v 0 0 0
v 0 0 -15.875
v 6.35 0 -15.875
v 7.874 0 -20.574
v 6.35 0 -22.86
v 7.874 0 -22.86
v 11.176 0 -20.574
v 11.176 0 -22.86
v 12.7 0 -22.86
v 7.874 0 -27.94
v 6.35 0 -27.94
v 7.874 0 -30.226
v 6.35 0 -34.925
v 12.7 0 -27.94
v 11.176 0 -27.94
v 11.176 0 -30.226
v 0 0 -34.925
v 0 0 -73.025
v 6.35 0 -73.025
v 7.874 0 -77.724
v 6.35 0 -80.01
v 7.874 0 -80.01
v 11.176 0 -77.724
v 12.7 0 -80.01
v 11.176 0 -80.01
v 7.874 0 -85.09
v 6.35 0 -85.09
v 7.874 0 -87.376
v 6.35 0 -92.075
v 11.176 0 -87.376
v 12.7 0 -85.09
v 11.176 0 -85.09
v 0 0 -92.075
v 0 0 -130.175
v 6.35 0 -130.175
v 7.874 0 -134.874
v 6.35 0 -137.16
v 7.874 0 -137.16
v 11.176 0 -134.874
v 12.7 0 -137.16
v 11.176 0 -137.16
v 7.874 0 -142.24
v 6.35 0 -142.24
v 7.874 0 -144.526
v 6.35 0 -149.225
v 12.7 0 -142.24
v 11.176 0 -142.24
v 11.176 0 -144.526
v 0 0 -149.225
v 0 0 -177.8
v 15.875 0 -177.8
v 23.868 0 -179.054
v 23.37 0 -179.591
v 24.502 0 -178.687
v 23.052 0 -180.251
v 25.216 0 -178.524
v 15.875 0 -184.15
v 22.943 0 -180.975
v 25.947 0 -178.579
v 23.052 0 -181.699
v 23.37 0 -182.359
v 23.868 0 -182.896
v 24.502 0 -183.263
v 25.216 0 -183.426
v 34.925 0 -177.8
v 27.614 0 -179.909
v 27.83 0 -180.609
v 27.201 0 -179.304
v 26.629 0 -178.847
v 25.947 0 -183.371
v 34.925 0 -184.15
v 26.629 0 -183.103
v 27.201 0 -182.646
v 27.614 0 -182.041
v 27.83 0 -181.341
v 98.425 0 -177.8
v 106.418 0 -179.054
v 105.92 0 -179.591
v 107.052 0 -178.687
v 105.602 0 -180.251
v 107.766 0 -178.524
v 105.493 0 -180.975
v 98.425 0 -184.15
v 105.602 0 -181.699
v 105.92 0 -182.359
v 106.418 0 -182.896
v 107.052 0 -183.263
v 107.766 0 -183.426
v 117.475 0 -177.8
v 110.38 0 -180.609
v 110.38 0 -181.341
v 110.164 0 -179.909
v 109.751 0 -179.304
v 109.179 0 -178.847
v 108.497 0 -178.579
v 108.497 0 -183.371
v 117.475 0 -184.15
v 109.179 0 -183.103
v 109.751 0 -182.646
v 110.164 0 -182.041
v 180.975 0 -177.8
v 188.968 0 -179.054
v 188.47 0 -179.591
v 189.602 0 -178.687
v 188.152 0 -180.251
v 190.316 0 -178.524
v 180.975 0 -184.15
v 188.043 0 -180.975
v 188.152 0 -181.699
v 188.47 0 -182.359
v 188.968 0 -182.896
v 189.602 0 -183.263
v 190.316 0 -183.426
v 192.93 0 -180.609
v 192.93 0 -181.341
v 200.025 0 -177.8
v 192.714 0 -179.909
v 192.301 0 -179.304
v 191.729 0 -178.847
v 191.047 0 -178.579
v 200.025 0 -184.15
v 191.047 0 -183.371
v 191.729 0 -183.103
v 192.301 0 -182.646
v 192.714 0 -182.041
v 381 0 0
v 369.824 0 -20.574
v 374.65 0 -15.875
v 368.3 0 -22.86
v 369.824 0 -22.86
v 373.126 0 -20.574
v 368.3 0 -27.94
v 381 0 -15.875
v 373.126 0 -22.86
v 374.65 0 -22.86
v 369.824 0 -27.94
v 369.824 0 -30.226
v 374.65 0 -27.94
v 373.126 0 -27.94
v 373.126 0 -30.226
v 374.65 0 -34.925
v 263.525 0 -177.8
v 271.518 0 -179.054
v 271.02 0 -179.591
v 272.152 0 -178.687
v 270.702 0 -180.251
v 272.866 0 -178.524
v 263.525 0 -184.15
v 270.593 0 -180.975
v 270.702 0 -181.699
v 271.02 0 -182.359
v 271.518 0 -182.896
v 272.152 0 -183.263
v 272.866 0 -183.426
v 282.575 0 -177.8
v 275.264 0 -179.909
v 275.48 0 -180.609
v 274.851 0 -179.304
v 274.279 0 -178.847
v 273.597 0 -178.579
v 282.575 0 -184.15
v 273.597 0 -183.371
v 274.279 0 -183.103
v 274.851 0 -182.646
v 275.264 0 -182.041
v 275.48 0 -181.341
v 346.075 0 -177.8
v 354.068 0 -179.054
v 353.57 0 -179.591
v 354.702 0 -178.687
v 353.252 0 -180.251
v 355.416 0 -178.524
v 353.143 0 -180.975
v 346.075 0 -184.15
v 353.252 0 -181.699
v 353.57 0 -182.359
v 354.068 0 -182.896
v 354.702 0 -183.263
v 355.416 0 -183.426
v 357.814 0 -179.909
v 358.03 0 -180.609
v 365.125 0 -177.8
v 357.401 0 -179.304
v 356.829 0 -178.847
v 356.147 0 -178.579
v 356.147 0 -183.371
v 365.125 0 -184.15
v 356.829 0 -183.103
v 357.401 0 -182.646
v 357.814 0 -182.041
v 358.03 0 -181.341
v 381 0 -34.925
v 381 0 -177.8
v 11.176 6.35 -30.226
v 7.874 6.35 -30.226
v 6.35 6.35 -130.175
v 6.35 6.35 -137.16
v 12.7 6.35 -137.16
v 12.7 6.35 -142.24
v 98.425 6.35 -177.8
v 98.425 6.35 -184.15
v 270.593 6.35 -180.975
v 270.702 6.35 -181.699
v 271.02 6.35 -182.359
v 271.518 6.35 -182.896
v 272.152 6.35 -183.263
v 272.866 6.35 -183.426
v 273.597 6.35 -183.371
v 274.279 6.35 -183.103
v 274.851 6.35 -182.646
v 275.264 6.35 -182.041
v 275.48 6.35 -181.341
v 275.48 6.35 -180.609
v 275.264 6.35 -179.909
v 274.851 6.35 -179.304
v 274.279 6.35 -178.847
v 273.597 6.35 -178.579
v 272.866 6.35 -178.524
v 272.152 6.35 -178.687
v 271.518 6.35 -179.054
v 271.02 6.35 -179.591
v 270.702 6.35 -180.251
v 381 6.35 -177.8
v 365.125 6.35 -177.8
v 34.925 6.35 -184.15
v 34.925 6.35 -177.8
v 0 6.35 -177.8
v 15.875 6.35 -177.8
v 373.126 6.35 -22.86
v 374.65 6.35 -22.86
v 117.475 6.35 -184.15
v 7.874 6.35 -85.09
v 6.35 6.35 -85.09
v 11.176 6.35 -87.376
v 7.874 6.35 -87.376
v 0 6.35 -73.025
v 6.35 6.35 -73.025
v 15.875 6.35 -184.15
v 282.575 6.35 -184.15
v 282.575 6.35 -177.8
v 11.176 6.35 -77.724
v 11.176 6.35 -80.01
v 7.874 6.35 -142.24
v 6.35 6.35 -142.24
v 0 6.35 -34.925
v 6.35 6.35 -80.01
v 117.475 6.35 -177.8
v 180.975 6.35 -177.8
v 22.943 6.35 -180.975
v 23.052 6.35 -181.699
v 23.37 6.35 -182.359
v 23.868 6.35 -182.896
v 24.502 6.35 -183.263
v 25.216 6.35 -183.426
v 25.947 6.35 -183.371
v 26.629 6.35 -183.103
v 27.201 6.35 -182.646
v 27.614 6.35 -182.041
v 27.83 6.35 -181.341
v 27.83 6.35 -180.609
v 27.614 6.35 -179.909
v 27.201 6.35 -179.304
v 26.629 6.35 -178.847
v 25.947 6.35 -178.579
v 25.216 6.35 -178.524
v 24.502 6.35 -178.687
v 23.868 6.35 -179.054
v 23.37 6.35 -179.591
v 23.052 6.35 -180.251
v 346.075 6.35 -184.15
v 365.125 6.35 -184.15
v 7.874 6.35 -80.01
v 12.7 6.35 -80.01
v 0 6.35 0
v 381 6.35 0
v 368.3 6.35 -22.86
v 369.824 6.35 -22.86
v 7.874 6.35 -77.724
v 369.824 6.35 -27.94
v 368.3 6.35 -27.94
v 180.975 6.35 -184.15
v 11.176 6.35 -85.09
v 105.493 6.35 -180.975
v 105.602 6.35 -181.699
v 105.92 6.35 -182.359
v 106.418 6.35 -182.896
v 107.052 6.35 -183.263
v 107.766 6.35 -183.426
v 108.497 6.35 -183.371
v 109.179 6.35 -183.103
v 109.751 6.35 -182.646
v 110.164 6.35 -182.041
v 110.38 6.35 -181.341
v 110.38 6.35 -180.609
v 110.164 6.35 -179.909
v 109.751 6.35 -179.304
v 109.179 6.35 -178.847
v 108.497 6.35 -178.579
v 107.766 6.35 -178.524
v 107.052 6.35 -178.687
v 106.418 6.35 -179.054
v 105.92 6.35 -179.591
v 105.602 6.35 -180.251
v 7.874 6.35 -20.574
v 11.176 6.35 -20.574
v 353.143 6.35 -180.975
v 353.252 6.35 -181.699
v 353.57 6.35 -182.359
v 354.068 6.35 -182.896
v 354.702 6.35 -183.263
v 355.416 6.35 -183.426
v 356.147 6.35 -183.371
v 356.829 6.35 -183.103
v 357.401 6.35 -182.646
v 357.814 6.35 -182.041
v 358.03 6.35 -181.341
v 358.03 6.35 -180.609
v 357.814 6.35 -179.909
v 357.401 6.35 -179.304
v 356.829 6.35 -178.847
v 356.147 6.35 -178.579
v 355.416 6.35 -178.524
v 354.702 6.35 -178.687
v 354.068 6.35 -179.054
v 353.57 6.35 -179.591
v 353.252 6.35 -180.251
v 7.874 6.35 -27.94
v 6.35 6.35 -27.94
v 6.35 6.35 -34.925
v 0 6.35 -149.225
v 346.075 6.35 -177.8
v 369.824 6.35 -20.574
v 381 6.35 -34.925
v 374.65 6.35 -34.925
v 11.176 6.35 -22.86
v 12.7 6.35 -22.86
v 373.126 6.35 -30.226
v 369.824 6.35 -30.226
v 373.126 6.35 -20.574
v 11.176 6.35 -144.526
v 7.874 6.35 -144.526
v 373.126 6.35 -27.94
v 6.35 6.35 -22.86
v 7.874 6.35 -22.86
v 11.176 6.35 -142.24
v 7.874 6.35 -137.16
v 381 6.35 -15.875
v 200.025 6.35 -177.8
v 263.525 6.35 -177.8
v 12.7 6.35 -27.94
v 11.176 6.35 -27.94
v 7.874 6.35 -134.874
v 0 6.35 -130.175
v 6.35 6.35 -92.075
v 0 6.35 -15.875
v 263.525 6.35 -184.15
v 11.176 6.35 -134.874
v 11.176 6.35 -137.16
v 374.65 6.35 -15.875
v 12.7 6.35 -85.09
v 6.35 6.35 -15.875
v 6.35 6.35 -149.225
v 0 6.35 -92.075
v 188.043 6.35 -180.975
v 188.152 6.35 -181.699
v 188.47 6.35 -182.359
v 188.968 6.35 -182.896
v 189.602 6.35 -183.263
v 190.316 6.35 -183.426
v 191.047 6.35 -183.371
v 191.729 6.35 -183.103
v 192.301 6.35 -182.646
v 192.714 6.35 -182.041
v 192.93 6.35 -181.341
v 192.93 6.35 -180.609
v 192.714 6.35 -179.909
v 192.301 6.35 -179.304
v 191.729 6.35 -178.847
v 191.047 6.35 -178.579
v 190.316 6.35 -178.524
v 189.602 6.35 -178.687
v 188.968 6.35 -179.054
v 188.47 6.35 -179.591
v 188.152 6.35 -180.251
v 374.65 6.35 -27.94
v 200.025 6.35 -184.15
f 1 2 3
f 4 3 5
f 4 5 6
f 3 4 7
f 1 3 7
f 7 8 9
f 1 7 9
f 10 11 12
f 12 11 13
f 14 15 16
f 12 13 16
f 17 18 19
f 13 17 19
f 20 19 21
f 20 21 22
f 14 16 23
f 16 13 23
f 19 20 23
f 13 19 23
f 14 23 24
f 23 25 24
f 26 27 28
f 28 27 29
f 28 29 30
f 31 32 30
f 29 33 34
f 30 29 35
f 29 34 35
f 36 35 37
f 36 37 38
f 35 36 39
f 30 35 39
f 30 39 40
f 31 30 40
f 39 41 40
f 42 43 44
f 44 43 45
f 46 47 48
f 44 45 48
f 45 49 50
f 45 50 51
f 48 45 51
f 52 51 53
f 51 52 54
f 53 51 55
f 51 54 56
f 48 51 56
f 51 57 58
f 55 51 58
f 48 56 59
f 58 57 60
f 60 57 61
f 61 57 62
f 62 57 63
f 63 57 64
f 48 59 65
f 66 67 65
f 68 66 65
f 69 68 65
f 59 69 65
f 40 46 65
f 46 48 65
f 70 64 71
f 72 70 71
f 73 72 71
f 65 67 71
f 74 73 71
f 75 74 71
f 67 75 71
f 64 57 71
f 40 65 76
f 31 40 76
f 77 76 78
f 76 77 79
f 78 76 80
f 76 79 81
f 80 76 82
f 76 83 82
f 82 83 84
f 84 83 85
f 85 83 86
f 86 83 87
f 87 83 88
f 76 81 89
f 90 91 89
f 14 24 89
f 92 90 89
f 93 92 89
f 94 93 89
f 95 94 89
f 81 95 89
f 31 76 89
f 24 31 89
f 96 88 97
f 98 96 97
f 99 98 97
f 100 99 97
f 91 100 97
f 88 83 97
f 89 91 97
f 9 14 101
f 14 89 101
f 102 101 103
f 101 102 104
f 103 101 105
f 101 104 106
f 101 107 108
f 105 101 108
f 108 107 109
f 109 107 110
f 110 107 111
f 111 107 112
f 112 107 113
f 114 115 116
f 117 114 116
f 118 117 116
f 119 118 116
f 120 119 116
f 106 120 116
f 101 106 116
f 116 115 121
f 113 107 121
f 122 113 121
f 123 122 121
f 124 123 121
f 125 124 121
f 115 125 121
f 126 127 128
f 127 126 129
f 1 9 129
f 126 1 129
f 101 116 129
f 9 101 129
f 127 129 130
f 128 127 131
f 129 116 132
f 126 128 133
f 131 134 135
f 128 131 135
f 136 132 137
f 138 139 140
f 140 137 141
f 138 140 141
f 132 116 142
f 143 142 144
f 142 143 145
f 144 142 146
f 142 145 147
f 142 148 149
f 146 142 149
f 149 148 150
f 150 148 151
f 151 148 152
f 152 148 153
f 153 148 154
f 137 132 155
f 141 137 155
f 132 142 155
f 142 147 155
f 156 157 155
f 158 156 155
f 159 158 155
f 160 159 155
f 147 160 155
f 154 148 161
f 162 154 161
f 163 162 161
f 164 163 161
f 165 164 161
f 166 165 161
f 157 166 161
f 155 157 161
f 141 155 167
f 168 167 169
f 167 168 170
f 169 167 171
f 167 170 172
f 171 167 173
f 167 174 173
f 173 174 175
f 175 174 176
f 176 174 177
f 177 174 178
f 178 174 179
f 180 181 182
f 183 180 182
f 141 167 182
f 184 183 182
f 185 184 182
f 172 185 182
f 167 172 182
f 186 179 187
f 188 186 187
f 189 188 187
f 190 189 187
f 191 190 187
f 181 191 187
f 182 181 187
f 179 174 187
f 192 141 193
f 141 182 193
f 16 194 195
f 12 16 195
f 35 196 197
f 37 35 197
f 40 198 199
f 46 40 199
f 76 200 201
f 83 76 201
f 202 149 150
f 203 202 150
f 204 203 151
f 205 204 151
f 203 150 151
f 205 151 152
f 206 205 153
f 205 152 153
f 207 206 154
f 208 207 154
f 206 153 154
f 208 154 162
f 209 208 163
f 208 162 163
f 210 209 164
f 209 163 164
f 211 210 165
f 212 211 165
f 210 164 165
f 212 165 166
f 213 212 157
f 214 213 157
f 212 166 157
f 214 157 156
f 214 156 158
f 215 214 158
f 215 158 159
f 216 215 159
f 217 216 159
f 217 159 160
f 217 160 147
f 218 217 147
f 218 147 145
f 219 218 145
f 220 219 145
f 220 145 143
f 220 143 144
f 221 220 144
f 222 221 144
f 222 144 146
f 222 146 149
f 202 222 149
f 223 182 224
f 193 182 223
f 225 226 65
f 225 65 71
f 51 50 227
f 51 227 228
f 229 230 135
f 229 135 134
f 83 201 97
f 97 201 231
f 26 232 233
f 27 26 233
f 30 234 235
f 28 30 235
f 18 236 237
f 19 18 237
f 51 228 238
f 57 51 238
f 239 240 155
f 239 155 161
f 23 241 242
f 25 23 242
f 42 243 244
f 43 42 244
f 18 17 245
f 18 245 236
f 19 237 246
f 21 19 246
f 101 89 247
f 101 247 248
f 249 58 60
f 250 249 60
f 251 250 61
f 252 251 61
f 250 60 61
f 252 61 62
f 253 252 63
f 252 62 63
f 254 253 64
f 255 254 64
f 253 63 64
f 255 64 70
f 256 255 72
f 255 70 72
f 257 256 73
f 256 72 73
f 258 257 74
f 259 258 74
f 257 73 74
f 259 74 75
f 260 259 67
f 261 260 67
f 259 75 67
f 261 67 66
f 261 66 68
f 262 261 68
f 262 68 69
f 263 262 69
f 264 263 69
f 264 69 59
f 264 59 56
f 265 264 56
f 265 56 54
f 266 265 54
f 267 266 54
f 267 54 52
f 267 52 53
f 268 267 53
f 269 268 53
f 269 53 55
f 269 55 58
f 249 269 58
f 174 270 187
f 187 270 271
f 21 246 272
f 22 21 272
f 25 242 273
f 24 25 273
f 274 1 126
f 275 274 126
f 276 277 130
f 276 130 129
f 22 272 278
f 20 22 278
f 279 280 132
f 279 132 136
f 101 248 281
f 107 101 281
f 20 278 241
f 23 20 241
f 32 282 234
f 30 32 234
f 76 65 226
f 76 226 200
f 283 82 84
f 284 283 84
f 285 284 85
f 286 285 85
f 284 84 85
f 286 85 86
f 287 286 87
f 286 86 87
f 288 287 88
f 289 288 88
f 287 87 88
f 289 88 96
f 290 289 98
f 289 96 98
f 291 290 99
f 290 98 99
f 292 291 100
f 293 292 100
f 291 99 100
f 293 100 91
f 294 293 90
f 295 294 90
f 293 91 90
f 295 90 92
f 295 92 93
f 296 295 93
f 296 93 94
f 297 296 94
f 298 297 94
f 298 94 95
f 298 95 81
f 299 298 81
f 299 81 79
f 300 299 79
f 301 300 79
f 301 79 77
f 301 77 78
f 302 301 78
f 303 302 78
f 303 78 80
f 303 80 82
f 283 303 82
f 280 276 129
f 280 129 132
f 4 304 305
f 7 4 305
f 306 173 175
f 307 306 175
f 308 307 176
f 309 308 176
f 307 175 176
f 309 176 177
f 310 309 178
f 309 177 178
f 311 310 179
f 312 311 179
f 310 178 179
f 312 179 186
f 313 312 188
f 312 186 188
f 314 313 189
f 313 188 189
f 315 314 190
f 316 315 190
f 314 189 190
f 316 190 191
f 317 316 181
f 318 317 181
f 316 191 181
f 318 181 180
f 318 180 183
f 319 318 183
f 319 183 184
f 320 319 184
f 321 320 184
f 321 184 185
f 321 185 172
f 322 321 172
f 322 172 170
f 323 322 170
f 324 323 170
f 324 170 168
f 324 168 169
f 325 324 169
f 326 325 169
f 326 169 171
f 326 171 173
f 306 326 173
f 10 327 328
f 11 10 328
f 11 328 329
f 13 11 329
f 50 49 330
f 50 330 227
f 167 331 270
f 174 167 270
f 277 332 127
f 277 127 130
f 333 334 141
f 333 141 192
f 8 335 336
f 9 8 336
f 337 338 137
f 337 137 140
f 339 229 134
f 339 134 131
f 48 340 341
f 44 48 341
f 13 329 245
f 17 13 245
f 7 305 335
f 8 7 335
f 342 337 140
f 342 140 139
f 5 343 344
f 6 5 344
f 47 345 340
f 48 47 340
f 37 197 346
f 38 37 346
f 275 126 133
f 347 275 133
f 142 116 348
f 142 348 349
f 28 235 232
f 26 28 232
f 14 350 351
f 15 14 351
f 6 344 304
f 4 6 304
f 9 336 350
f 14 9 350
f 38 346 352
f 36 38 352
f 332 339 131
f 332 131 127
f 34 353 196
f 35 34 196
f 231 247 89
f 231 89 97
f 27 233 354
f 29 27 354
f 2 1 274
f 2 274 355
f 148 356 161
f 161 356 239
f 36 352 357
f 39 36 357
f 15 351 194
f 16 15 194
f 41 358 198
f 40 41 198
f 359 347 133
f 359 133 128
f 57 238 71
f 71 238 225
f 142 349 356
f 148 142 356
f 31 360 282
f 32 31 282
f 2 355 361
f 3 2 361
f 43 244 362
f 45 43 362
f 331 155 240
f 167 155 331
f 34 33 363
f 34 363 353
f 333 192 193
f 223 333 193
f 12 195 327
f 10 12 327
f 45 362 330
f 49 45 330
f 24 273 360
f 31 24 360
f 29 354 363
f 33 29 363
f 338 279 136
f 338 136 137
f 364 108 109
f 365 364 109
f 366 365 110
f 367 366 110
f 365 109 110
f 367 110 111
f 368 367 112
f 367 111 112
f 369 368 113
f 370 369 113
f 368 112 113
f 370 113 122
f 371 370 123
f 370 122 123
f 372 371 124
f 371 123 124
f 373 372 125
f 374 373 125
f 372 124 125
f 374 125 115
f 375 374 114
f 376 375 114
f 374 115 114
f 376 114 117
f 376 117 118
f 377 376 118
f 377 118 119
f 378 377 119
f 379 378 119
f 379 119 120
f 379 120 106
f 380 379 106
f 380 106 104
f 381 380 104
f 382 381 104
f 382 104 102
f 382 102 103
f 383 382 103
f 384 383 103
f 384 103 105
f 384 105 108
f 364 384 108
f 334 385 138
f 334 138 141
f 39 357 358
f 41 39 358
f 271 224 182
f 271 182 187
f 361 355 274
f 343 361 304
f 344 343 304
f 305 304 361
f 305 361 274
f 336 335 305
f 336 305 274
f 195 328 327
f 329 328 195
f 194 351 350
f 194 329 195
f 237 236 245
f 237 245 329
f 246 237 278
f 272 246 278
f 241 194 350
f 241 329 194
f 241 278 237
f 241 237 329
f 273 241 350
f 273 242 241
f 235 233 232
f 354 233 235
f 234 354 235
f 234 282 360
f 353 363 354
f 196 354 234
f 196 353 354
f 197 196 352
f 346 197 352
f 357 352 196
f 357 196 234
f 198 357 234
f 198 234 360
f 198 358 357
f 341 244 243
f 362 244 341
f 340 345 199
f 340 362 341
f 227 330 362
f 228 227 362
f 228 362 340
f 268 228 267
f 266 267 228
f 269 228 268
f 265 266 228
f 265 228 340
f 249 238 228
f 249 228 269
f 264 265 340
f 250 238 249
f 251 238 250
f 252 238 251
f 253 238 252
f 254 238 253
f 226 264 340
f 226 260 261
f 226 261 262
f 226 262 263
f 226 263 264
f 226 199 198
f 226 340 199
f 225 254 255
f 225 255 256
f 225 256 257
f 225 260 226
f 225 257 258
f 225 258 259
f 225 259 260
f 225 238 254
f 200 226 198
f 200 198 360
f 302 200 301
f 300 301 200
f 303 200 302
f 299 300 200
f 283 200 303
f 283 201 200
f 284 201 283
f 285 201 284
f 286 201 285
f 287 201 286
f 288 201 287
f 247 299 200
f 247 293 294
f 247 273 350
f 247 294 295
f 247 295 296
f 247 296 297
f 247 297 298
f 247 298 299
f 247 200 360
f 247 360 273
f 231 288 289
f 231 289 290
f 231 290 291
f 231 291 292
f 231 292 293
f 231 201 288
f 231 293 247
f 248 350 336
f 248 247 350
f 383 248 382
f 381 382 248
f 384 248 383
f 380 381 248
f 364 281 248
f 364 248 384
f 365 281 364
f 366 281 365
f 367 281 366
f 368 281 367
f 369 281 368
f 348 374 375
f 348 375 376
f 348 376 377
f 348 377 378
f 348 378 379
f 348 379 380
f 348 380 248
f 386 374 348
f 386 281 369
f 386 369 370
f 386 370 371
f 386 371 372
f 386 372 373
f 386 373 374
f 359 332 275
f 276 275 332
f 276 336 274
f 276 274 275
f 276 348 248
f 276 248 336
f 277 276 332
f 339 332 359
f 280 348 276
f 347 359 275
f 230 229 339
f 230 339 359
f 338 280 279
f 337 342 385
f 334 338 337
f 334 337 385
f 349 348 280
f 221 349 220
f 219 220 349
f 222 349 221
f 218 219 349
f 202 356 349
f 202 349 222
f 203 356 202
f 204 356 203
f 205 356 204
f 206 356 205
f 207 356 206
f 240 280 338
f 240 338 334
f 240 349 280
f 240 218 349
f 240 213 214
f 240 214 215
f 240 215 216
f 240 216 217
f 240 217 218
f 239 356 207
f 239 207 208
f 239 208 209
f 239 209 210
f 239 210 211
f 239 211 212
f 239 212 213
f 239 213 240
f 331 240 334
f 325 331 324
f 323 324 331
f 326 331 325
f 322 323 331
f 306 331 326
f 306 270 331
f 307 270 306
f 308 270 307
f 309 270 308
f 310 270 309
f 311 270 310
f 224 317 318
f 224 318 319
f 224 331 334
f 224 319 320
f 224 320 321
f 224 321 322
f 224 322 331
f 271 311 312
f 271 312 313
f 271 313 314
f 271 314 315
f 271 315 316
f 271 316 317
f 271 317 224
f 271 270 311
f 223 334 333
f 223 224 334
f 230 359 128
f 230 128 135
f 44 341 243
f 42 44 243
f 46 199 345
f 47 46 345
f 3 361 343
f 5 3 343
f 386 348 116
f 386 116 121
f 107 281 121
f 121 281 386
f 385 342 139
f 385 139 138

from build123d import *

# Parameters (mm, degrees)
SKETCH1_W                    = 381
SKETCH1_H                    = 177.8
BOSS_EXTRUDE1_DEPTH          = 6.35
SKETCH2_W                    = 19.05
SKETCH2_H                    = 6.35
BOSS_EXTRUDE2_DEPTH          = 6.35
F_10_0_1935_DIAMETER_HOLE1_D = 4.9149
LPATTERN1_COUNT              = 5
LPATTERN1_PITCH              = 82.55
CUT_EXTRUDE2_DEPTH           = 424.216900655
LPATTERN4_COUNT              = 3
LPATTERN4_PITCH              = 57.15


with BuildPart() as part:
    # Sketch1 → Boss-Extrude1 (new body)
    with BuildSketch(Plane(origin=(0, 0, 0), x_dir=(1, 0, 0), z_dir=(0, 1, 0))):
        with Locations((190.5, 88.9)):
            Rectangle(SKETCH1_W, SKETCH1_H)
    extrude(amount=BOSS_EXTRUDE1_DEPTH)

    # Sketch2 → Boss-Extrude2 (add)
    with BuildSketch(Plane(origin=(0, 6.35, 0), x_dir=(1, 0, 0), z_dir=(0, 1, 0))):
        with Locations((25.4, 180.975)):
            Rectangle(SKETCH2_W, SKETCH2_H)
    boss_extrude2 = extrude(amount=-BOSS_EXTRUDE2_DEPTH)

    # #10 (0.1935) Diameter Hole1 (through all)
    with Locations(Plane(origin=(0, 6.35, 0), x_dir=(1, 0, 0), z_dir=(0, 1, 0))):
        with Locations((25.4, 180.975)):
            f_10_0_1935_diameter_hole1 = Hole(F_10_0_1935_DIAMETER_HOLE1_D / 2)

    # LPattern1: Boss-Extrude2, #10 (0.1935) Diameter Hole1 ×5
    with Locations(*[(i * LPATTERN1_PITCH, 0, 0) for i in range(1, LPATTERN1_COUNT)]):
        add(boss_extrude2)
        add(f_10_0_1935_diameter_hole1, mode=Mode.SUBTRACT)

    # Sketch7 → Cut-Extrude2 (cut, through all)
    with BuildSketch(Plane(origin=(0, 6.35, 0), x_dir=(1, 0, 0), z_dir=(0, 1, 0))):
        Polygon((0, 34.925), (0, 15.875), (6.35, 15.875), (6.35, 22.86), (7.874, 22.86), (7.874, 20.574), (11.176, 20.574), (11.176, 22.86), (12.7, 22.86), (12.7, 27.94), (11.176, 27.94), (11.176, 30.226), (7.874, 30.226), (7.874, 27.94), (6.35, 27.94), (6.35, 34.925), align=None)
    cut_extrude2 = extrude(amount=-CUT_EXTRUDE2_DEPTH, mode=Mode.SUBTRACT)

    # Mirror2: Cut-Extrude2 across plane
    add(cut_extrude2.mirror(Plane.ZY.offset(-190.5)), mode=Mode.SUBTRACT)

    # LPattern4: Cut-Extrude2 ×3
    with Locations(*[(0, 0, -i * LPATTERN4_PITCH) for i in range(1, LPATTERN4_COUNT)]):
        add(cut_extrude2, mode=Mode.SUBTRACT)


solid = part.part
